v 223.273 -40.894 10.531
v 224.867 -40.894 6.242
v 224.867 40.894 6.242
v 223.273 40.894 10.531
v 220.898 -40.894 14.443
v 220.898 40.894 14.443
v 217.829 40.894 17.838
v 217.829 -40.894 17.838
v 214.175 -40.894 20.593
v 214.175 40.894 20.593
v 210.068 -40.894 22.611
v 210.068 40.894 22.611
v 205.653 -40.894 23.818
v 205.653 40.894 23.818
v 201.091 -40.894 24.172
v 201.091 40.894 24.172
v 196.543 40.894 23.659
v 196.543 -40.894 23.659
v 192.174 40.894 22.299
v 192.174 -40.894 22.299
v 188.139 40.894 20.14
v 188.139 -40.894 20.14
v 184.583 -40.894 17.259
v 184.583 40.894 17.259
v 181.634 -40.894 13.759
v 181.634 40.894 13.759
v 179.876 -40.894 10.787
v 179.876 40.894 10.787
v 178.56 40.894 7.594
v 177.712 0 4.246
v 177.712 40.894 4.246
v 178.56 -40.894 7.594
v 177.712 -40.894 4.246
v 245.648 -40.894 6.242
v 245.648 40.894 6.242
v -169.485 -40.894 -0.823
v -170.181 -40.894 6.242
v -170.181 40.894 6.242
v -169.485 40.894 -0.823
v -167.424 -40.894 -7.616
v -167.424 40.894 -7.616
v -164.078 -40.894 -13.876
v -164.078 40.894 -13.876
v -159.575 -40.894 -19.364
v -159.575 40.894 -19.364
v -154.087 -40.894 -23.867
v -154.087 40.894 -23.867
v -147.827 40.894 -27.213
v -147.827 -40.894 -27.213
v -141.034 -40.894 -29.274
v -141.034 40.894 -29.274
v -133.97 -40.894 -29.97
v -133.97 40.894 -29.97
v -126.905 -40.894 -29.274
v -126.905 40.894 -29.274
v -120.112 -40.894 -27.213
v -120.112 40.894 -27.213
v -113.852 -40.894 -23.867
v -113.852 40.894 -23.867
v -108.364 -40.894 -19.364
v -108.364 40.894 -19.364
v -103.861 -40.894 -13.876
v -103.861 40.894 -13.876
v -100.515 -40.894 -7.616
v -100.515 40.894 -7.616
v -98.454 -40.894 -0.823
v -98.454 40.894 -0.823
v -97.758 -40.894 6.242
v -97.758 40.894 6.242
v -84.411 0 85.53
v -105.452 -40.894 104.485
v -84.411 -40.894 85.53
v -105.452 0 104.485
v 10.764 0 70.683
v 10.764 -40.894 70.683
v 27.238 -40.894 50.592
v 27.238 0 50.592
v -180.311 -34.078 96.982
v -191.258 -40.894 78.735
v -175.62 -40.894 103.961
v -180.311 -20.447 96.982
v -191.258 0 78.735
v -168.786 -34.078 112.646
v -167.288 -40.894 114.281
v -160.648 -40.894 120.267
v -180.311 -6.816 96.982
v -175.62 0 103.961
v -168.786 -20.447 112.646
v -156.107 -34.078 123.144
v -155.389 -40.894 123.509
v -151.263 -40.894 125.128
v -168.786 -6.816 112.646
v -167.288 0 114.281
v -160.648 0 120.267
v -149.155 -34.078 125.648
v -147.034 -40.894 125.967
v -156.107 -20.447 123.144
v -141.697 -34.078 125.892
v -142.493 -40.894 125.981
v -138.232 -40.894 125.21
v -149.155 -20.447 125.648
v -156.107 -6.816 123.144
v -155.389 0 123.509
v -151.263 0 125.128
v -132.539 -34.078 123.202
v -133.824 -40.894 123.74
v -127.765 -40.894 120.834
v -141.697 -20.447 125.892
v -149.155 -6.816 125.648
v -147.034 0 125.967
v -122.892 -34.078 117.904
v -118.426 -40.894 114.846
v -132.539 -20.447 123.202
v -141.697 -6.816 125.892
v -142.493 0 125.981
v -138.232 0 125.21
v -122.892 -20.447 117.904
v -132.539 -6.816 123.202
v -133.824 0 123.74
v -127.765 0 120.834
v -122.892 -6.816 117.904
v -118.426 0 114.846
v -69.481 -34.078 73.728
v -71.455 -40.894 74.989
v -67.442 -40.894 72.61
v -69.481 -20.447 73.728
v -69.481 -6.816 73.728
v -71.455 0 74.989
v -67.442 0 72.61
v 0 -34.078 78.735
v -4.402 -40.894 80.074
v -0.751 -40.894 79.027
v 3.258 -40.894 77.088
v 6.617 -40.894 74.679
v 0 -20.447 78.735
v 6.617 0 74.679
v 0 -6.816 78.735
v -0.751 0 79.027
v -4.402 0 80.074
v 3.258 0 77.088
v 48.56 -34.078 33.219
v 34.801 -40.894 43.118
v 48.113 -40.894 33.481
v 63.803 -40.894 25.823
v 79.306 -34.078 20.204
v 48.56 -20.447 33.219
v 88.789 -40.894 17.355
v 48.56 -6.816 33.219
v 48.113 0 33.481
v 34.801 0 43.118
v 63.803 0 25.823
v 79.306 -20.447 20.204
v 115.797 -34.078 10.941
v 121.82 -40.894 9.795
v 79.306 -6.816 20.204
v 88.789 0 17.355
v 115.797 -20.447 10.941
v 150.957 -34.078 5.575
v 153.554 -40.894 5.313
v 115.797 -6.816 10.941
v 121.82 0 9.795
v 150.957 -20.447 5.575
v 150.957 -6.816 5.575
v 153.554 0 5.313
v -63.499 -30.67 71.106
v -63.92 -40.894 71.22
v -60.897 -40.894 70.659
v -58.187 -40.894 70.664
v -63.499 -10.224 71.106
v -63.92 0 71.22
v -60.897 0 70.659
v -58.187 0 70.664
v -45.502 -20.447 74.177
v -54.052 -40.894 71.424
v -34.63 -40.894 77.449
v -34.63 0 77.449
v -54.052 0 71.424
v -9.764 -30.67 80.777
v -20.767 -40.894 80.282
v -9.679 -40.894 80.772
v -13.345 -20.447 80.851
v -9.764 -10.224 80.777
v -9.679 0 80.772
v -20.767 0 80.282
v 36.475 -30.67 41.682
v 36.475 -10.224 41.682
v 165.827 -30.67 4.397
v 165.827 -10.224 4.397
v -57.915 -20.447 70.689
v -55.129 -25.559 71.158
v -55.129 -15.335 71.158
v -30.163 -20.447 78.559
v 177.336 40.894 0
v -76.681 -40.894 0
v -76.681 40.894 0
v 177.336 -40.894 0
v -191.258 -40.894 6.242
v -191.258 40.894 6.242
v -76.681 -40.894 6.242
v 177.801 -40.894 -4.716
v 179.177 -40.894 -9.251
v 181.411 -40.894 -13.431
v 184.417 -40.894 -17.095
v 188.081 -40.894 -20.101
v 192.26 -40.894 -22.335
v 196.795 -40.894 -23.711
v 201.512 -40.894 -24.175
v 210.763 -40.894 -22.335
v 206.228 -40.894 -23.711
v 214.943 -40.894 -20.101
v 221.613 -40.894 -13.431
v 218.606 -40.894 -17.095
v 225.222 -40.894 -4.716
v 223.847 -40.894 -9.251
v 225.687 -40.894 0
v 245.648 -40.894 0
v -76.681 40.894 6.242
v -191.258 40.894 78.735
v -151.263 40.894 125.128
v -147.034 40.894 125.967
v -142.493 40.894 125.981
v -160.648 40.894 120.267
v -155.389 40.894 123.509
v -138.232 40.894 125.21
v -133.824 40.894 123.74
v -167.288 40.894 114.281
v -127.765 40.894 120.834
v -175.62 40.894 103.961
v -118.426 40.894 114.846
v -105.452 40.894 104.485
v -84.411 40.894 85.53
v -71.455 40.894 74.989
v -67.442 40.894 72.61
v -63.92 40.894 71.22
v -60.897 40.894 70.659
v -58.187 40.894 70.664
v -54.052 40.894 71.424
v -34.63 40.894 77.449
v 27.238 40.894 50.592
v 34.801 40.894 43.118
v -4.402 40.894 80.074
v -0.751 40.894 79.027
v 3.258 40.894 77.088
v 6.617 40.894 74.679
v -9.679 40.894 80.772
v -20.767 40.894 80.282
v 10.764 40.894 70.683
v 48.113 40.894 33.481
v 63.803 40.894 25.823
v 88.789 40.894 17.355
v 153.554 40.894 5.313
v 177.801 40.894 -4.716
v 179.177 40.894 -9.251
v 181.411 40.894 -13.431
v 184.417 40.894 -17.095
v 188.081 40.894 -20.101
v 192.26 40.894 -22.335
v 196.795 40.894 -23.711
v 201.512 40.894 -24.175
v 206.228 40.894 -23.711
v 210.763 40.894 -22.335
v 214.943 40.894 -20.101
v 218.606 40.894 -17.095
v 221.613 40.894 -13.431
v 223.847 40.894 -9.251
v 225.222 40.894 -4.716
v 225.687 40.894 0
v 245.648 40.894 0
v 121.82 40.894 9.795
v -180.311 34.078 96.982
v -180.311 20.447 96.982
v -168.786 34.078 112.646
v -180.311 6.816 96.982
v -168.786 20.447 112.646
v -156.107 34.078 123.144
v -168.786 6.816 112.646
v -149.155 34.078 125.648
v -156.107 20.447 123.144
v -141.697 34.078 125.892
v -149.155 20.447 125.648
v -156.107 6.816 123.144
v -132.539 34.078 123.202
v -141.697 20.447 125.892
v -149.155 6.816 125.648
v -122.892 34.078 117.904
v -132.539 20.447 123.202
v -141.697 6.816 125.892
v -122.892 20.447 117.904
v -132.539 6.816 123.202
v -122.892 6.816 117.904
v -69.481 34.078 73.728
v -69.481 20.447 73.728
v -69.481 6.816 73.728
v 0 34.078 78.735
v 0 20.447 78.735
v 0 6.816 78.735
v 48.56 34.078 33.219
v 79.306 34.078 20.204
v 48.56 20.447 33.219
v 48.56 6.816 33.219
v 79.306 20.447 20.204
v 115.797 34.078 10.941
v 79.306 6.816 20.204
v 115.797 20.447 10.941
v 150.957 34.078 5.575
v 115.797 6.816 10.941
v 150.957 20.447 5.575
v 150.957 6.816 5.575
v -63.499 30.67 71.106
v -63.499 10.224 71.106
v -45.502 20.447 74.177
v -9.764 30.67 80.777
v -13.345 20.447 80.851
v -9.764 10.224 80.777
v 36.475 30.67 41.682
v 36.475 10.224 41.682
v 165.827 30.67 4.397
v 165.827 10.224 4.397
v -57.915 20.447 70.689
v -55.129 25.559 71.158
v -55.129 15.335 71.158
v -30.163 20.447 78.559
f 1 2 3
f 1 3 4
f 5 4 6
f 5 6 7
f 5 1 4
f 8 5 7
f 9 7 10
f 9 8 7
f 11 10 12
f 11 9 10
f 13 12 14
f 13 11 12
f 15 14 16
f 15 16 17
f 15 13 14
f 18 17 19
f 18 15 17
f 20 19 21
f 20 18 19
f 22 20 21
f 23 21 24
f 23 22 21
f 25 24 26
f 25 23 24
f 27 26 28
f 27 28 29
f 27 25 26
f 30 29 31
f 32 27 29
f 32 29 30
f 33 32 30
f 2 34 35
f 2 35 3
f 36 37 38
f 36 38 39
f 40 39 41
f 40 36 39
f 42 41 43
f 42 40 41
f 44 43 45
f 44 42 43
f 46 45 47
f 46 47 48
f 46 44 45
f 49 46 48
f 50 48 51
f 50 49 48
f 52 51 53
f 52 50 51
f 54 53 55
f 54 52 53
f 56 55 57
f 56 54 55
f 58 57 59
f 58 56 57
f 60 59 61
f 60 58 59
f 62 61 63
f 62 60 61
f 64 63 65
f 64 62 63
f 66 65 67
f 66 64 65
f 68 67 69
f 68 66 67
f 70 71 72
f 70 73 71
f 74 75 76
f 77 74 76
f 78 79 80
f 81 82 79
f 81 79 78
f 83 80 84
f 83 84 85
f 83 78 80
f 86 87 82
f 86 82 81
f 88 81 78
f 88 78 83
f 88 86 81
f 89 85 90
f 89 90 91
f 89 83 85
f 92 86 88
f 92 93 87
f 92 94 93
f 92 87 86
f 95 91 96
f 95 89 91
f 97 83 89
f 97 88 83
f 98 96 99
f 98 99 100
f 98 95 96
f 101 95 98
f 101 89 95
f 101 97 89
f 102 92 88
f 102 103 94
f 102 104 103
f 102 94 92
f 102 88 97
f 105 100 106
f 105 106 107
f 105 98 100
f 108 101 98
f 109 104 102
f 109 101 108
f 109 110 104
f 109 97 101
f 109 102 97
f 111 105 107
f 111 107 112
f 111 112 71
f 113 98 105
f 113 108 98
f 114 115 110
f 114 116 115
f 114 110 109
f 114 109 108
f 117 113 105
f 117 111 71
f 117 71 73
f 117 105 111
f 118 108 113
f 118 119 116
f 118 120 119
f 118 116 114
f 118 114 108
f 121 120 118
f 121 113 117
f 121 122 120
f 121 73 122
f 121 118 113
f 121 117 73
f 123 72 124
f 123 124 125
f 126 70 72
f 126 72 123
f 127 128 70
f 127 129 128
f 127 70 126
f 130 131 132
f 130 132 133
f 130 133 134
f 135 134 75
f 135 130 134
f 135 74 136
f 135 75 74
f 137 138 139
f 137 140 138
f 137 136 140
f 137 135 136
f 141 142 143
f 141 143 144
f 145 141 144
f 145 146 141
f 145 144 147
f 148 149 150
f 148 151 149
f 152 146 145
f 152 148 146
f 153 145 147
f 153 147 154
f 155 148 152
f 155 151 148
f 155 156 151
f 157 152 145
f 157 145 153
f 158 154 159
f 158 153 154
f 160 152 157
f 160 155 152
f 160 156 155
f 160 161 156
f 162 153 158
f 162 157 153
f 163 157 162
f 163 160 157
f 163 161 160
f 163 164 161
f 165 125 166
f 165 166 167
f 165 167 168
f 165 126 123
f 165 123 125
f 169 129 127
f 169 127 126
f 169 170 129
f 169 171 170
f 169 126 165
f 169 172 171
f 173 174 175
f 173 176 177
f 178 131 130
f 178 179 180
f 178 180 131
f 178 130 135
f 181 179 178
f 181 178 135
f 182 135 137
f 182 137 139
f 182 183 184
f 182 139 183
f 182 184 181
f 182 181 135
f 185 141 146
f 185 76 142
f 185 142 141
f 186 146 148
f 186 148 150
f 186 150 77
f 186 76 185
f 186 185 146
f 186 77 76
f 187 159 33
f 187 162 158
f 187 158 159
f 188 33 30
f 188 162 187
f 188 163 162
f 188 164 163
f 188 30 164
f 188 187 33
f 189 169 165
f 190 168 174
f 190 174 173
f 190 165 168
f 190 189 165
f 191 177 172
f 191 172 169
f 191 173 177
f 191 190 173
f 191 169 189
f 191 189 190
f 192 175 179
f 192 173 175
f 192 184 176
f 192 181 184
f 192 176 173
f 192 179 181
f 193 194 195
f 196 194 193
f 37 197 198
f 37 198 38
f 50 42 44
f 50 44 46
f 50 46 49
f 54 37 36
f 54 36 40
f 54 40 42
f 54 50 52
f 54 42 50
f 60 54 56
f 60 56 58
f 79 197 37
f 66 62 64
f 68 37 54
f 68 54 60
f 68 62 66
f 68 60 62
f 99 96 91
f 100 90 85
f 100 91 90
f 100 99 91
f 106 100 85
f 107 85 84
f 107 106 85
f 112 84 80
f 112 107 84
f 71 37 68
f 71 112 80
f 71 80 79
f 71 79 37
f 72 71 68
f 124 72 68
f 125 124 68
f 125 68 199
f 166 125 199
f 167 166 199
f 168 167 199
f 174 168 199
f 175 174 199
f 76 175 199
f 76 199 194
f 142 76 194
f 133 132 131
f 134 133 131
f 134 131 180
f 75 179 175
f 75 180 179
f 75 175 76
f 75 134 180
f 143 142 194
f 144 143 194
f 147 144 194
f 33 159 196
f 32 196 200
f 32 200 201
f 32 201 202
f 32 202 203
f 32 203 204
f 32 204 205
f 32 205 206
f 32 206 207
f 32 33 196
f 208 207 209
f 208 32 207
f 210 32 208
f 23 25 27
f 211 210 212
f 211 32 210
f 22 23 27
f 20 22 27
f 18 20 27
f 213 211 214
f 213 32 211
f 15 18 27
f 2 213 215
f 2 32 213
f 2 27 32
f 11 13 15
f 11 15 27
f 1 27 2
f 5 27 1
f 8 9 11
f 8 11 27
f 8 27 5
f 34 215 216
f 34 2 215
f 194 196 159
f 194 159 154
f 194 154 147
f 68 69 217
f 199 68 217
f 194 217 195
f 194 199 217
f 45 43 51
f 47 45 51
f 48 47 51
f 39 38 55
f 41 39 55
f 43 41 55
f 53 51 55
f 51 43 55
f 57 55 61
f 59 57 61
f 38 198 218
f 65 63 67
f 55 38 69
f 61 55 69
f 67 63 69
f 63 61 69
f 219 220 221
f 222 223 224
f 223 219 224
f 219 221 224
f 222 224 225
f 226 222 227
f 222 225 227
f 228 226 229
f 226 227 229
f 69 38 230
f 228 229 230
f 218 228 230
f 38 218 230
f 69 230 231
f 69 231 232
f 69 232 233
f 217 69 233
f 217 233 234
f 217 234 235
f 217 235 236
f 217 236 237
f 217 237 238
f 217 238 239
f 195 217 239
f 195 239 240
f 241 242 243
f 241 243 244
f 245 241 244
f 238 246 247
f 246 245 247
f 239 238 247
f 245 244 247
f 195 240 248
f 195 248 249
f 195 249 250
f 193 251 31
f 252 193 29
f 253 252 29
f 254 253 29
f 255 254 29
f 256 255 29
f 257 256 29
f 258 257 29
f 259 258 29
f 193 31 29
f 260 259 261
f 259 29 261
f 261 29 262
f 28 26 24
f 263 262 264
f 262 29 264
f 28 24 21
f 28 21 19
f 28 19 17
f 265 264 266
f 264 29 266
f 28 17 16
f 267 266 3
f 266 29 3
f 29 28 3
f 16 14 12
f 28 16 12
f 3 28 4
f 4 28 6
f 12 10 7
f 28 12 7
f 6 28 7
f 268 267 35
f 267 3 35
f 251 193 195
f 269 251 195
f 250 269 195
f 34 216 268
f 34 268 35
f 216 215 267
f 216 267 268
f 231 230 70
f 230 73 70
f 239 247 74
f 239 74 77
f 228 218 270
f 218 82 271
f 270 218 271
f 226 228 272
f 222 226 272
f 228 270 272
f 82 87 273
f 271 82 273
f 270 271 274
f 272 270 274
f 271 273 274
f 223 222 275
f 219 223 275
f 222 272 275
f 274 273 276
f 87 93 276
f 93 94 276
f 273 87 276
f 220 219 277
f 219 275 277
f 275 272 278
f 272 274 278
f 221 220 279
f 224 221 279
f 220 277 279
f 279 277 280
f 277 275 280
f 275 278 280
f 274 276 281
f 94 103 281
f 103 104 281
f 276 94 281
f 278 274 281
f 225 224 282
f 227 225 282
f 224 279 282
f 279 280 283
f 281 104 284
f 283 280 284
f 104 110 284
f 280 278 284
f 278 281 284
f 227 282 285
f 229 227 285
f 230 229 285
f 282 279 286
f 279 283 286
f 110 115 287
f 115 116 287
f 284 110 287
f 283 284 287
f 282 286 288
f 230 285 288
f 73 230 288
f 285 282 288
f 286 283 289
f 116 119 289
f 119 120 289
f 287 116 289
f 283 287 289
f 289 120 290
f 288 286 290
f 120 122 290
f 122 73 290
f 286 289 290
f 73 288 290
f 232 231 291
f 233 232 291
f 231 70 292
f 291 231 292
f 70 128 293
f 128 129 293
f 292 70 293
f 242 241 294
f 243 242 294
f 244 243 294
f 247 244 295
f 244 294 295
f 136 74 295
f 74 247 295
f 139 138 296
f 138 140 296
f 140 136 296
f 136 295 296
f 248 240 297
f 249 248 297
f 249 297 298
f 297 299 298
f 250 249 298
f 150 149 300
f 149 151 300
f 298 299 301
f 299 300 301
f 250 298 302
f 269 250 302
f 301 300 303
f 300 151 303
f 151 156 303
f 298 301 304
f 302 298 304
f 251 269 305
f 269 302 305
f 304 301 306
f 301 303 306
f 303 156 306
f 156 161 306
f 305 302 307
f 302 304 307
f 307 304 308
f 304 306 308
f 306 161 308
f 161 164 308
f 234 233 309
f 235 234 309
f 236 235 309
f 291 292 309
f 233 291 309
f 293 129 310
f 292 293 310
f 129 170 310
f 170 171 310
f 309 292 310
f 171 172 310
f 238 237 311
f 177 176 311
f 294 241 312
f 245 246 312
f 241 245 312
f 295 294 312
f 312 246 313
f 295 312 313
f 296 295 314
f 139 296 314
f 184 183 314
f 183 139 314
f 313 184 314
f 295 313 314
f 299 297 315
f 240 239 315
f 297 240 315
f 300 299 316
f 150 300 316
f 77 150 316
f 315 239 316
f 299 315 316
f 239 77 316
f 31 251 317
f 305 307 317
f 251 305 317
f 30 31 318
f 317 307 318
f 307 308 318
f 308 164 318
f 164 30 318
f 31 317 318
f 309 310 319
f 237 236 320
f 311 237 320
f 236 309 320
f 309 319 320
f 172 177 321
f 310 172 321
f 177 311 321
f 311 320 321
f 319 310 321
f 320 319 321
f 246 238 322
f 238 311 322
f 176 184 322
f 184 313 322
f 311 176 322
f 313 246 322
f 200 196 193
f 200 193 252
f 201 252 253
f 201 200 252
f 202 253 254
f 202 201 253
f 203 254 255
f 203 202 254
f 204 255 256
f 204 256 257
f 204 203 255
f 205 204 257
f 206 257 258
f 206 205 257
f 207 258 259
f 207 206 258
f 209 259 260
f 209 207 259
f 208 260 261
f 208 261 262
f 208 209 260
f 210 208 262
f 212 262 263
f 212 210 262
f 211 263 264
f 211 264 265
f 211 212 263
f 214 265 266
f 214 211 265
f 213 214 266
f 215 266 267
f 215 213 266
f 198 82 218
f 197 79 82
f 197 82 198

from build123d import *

# Parameters (mm, degrees)
F1_DEPTH = 40.894


with BuildPart() as f1:
    # F0 (on Front) → F1 (new body, symmetric)
    with BuildSketch(Plane.XZ):
        with BuildLine():
            Line((-76.6813904047, 0), (0, 0))
            Line((0, 0), (177.3363044405, 0))
            ThreePointArc((177.3363044405, 0), (177.4304373111, 2.1313178945), (177.7121028601, 4.2460380848))
            add(Edge.make_bspline(
                [(-191.2576705217, 78.735254705), (-176.7897142616, 103.6389034097), (-145.811693862, 156.9612748441), (-70.8007437924, 64.4715314557), (-48.7217952677, 73.6846603691), (11.6334131844, 91.5343821925), (26.4694964535, 21.7901076067), (150.7868761319, 3.2615863275), (177.7121028601, 4.2460380848)],
                knots=[0, 0, 0, 0, 0.1427505464, 0.3056498968, 0.3872509014, 0.5060771131, 0.6468803412, 0.8180400538, 0.8180400538, 0.8180400538, 0.8180400538], degree=3))
            Line((-191.2576705217, 78.735254705), (-191.2576705217, 6.2415054999))
            Line((-191.2576705217, 6.2415054999), (-170.1806822344, 6.2415054999))
            ThreePointArc((-170.1806822344, 6.2415054999), (-133.9695304632, 42.4526572712), (-97.758378692, 6.2415054999))
            Line((-97.758378692, 6.2415054999), (-76.6813904047, 6.2415054999))
            Line((-76.6813904047, 6.2415054999), (-76.6813904047, 0))
        make_face()
        with BuildLine():
            ThreePointArc((177.7121028601, 4.2460380848), (177.4304373111, 2.1313178945), (177.3363044405, 0))
            Line((177.3363044405, 0), (188.1369203329, 0))
            Line((188.1369203329, 0), (214.8862481117, 0))
            Line((214.8862481117, 0), (225.6868640041, 0))
            ThreePointArc((225.6868640041, 0), (225.4810881516, 3.1475441078), (224.867263652, 6.2415054999))
            Line((224.867263652, 6.2415054999), (214.8862481117, 6.2415054999))
            add(Edge.make_bspline(
                [(214.8862481117, 6.2415054999), (211.4686790941, 9.9028269528), (204.3524508043, 17.5266084088), (189.9467467672, 6.8039804975), (188.3806139351, 6.2415055042)],
                knots=[0, 0, 0, 0, 0.4416018613, 0.9195248558, 0.9195248558, 0.9195248558, 0.9195248558], degree=3))
            add(Edge.make_bspline(
                [(177.7121028601, 4.2460380848), (183.1855197187, 4.4461595137), (186.9530150931, 5.1070474778), (188.3806139297, 6.2415055052)],
                knots=[0.8180400538, 0.8180400538, 0.8180400538, 0.8180400538, 0.852833761, 0.852833761, 0.852833761, 0.852833761], degree=3))
        make_face()
        with BuildLine():
            Line((188.1369203329, 0), (177.3363044405, 0))
            ThreePointArc((177.3363044405, 0), (201.5115842223, -24.1752797818), (225.6868640041, 0))
            Line((225.6868640041, 0), (214.8862481117, 0))
            Line((214.8862481117, 0), (188.1369203329, 0))
        make_face()
        with BuildLine():
            ThreePointArc((181.633862326, 13.759372251), (179.160960006, 9.2137804221), (177.7121028601, 4.2460380848))
            add(Edge.make_bspline(
                [(177.7121028601, 4.2460380848), (183.1855197187, 4.4461595137), (186.9530150931, 5.1070474778), (188.3806139297, 6.2415055052)],
                knots=[0.8180400538, 0.8180400538, 0.8180400538, 0.8180400538, 0.852833761, 0.852833761, 0.852833761, 0.852833761], degree=3))
            add(Edge.make_bspline(
                [(188.3806139297, 6.2415055052), (190.4374784842, 7.8760168576), (187.6370347083, 10.4935955276), (181.6338623191, 13.7593722558)],
                knots=[0.852833761, 0.852833761, 0.852833761, 0.852833761, 0.9029640508, 0.9029640508, 0.9029640508, 0.9029640508], degree=3))
        make_face()
        with BuildLine():
            ThreePointArc((224.867263652, 6.2415054999), (225.4810881516, 3.1475441078), (225.6868640041, 0))
            Line((225.6868640041, 0), (245.6479817629, 0))
            Line((245.6479817629, 0), (245.6479817629, 6.2415054999))
            Line((245.6479817629, 6.2415054999), (224.867263652, 6.2415054999))
        make_face()
        with BuildLine():
            ThreePointArc((-170.1806822344, 6.2415054999), (-133.9695304632, -29.9696462713), (-97.758378692, 6.2415054999))
            Line((-97.758378692, 6.2415054999), (-170.1806822344, 6.2415054999))
        make_face()
        with BuildLine():
            Line((-170.1806822344, 6.2415054999), (-97.758378692, 6.2415054999))
            ThreePointArc((-97.758378692, 6.2415054999), (-133.9695304632, 42.4526572712), (-170.1806822344, 6.2415054999))
        make_face()
        with BuildLine():
            add(Edge.make_bspline(
                [(188.3806139297, 6.2415055052), (190.4374784842, 7.8760168576), (187.6370347083, 10.4935955276), (181.6338623191, 13.7593722558)],
                knots=[0.852833761, 0.852833761, 0.852833761, 0.852833761, 0.9029640508, 0.9029640508, 0.9029640508, 0.9029640508], degree=3))
            add(Edge.make_bspline(
                [(214.8862481117, 6.2415054999), (211.4686790941, 9.9028269528), (204.3524508043, 17.5266084088), (189.9467467672, 6.8039804975), (188.3806139351, 6.2415055042)],
                knots=[0, 0, 0, 0, 0.4416018613, 0.9195248558, 0.9195248558, 0.9195248558, 0.9195248558], degree=3))
            Line((214.8862481117, 6.2415054999), (224.867263652, 6.2415054999))
            ThreePointArc((224.867263652, 6.2415054999), (205.6532779909, 23.8178614753), (181.633862326, 13.759372251))
        make_face()
    extrude(amount=F1_DEPTH, both=True)


solid = f1.part
